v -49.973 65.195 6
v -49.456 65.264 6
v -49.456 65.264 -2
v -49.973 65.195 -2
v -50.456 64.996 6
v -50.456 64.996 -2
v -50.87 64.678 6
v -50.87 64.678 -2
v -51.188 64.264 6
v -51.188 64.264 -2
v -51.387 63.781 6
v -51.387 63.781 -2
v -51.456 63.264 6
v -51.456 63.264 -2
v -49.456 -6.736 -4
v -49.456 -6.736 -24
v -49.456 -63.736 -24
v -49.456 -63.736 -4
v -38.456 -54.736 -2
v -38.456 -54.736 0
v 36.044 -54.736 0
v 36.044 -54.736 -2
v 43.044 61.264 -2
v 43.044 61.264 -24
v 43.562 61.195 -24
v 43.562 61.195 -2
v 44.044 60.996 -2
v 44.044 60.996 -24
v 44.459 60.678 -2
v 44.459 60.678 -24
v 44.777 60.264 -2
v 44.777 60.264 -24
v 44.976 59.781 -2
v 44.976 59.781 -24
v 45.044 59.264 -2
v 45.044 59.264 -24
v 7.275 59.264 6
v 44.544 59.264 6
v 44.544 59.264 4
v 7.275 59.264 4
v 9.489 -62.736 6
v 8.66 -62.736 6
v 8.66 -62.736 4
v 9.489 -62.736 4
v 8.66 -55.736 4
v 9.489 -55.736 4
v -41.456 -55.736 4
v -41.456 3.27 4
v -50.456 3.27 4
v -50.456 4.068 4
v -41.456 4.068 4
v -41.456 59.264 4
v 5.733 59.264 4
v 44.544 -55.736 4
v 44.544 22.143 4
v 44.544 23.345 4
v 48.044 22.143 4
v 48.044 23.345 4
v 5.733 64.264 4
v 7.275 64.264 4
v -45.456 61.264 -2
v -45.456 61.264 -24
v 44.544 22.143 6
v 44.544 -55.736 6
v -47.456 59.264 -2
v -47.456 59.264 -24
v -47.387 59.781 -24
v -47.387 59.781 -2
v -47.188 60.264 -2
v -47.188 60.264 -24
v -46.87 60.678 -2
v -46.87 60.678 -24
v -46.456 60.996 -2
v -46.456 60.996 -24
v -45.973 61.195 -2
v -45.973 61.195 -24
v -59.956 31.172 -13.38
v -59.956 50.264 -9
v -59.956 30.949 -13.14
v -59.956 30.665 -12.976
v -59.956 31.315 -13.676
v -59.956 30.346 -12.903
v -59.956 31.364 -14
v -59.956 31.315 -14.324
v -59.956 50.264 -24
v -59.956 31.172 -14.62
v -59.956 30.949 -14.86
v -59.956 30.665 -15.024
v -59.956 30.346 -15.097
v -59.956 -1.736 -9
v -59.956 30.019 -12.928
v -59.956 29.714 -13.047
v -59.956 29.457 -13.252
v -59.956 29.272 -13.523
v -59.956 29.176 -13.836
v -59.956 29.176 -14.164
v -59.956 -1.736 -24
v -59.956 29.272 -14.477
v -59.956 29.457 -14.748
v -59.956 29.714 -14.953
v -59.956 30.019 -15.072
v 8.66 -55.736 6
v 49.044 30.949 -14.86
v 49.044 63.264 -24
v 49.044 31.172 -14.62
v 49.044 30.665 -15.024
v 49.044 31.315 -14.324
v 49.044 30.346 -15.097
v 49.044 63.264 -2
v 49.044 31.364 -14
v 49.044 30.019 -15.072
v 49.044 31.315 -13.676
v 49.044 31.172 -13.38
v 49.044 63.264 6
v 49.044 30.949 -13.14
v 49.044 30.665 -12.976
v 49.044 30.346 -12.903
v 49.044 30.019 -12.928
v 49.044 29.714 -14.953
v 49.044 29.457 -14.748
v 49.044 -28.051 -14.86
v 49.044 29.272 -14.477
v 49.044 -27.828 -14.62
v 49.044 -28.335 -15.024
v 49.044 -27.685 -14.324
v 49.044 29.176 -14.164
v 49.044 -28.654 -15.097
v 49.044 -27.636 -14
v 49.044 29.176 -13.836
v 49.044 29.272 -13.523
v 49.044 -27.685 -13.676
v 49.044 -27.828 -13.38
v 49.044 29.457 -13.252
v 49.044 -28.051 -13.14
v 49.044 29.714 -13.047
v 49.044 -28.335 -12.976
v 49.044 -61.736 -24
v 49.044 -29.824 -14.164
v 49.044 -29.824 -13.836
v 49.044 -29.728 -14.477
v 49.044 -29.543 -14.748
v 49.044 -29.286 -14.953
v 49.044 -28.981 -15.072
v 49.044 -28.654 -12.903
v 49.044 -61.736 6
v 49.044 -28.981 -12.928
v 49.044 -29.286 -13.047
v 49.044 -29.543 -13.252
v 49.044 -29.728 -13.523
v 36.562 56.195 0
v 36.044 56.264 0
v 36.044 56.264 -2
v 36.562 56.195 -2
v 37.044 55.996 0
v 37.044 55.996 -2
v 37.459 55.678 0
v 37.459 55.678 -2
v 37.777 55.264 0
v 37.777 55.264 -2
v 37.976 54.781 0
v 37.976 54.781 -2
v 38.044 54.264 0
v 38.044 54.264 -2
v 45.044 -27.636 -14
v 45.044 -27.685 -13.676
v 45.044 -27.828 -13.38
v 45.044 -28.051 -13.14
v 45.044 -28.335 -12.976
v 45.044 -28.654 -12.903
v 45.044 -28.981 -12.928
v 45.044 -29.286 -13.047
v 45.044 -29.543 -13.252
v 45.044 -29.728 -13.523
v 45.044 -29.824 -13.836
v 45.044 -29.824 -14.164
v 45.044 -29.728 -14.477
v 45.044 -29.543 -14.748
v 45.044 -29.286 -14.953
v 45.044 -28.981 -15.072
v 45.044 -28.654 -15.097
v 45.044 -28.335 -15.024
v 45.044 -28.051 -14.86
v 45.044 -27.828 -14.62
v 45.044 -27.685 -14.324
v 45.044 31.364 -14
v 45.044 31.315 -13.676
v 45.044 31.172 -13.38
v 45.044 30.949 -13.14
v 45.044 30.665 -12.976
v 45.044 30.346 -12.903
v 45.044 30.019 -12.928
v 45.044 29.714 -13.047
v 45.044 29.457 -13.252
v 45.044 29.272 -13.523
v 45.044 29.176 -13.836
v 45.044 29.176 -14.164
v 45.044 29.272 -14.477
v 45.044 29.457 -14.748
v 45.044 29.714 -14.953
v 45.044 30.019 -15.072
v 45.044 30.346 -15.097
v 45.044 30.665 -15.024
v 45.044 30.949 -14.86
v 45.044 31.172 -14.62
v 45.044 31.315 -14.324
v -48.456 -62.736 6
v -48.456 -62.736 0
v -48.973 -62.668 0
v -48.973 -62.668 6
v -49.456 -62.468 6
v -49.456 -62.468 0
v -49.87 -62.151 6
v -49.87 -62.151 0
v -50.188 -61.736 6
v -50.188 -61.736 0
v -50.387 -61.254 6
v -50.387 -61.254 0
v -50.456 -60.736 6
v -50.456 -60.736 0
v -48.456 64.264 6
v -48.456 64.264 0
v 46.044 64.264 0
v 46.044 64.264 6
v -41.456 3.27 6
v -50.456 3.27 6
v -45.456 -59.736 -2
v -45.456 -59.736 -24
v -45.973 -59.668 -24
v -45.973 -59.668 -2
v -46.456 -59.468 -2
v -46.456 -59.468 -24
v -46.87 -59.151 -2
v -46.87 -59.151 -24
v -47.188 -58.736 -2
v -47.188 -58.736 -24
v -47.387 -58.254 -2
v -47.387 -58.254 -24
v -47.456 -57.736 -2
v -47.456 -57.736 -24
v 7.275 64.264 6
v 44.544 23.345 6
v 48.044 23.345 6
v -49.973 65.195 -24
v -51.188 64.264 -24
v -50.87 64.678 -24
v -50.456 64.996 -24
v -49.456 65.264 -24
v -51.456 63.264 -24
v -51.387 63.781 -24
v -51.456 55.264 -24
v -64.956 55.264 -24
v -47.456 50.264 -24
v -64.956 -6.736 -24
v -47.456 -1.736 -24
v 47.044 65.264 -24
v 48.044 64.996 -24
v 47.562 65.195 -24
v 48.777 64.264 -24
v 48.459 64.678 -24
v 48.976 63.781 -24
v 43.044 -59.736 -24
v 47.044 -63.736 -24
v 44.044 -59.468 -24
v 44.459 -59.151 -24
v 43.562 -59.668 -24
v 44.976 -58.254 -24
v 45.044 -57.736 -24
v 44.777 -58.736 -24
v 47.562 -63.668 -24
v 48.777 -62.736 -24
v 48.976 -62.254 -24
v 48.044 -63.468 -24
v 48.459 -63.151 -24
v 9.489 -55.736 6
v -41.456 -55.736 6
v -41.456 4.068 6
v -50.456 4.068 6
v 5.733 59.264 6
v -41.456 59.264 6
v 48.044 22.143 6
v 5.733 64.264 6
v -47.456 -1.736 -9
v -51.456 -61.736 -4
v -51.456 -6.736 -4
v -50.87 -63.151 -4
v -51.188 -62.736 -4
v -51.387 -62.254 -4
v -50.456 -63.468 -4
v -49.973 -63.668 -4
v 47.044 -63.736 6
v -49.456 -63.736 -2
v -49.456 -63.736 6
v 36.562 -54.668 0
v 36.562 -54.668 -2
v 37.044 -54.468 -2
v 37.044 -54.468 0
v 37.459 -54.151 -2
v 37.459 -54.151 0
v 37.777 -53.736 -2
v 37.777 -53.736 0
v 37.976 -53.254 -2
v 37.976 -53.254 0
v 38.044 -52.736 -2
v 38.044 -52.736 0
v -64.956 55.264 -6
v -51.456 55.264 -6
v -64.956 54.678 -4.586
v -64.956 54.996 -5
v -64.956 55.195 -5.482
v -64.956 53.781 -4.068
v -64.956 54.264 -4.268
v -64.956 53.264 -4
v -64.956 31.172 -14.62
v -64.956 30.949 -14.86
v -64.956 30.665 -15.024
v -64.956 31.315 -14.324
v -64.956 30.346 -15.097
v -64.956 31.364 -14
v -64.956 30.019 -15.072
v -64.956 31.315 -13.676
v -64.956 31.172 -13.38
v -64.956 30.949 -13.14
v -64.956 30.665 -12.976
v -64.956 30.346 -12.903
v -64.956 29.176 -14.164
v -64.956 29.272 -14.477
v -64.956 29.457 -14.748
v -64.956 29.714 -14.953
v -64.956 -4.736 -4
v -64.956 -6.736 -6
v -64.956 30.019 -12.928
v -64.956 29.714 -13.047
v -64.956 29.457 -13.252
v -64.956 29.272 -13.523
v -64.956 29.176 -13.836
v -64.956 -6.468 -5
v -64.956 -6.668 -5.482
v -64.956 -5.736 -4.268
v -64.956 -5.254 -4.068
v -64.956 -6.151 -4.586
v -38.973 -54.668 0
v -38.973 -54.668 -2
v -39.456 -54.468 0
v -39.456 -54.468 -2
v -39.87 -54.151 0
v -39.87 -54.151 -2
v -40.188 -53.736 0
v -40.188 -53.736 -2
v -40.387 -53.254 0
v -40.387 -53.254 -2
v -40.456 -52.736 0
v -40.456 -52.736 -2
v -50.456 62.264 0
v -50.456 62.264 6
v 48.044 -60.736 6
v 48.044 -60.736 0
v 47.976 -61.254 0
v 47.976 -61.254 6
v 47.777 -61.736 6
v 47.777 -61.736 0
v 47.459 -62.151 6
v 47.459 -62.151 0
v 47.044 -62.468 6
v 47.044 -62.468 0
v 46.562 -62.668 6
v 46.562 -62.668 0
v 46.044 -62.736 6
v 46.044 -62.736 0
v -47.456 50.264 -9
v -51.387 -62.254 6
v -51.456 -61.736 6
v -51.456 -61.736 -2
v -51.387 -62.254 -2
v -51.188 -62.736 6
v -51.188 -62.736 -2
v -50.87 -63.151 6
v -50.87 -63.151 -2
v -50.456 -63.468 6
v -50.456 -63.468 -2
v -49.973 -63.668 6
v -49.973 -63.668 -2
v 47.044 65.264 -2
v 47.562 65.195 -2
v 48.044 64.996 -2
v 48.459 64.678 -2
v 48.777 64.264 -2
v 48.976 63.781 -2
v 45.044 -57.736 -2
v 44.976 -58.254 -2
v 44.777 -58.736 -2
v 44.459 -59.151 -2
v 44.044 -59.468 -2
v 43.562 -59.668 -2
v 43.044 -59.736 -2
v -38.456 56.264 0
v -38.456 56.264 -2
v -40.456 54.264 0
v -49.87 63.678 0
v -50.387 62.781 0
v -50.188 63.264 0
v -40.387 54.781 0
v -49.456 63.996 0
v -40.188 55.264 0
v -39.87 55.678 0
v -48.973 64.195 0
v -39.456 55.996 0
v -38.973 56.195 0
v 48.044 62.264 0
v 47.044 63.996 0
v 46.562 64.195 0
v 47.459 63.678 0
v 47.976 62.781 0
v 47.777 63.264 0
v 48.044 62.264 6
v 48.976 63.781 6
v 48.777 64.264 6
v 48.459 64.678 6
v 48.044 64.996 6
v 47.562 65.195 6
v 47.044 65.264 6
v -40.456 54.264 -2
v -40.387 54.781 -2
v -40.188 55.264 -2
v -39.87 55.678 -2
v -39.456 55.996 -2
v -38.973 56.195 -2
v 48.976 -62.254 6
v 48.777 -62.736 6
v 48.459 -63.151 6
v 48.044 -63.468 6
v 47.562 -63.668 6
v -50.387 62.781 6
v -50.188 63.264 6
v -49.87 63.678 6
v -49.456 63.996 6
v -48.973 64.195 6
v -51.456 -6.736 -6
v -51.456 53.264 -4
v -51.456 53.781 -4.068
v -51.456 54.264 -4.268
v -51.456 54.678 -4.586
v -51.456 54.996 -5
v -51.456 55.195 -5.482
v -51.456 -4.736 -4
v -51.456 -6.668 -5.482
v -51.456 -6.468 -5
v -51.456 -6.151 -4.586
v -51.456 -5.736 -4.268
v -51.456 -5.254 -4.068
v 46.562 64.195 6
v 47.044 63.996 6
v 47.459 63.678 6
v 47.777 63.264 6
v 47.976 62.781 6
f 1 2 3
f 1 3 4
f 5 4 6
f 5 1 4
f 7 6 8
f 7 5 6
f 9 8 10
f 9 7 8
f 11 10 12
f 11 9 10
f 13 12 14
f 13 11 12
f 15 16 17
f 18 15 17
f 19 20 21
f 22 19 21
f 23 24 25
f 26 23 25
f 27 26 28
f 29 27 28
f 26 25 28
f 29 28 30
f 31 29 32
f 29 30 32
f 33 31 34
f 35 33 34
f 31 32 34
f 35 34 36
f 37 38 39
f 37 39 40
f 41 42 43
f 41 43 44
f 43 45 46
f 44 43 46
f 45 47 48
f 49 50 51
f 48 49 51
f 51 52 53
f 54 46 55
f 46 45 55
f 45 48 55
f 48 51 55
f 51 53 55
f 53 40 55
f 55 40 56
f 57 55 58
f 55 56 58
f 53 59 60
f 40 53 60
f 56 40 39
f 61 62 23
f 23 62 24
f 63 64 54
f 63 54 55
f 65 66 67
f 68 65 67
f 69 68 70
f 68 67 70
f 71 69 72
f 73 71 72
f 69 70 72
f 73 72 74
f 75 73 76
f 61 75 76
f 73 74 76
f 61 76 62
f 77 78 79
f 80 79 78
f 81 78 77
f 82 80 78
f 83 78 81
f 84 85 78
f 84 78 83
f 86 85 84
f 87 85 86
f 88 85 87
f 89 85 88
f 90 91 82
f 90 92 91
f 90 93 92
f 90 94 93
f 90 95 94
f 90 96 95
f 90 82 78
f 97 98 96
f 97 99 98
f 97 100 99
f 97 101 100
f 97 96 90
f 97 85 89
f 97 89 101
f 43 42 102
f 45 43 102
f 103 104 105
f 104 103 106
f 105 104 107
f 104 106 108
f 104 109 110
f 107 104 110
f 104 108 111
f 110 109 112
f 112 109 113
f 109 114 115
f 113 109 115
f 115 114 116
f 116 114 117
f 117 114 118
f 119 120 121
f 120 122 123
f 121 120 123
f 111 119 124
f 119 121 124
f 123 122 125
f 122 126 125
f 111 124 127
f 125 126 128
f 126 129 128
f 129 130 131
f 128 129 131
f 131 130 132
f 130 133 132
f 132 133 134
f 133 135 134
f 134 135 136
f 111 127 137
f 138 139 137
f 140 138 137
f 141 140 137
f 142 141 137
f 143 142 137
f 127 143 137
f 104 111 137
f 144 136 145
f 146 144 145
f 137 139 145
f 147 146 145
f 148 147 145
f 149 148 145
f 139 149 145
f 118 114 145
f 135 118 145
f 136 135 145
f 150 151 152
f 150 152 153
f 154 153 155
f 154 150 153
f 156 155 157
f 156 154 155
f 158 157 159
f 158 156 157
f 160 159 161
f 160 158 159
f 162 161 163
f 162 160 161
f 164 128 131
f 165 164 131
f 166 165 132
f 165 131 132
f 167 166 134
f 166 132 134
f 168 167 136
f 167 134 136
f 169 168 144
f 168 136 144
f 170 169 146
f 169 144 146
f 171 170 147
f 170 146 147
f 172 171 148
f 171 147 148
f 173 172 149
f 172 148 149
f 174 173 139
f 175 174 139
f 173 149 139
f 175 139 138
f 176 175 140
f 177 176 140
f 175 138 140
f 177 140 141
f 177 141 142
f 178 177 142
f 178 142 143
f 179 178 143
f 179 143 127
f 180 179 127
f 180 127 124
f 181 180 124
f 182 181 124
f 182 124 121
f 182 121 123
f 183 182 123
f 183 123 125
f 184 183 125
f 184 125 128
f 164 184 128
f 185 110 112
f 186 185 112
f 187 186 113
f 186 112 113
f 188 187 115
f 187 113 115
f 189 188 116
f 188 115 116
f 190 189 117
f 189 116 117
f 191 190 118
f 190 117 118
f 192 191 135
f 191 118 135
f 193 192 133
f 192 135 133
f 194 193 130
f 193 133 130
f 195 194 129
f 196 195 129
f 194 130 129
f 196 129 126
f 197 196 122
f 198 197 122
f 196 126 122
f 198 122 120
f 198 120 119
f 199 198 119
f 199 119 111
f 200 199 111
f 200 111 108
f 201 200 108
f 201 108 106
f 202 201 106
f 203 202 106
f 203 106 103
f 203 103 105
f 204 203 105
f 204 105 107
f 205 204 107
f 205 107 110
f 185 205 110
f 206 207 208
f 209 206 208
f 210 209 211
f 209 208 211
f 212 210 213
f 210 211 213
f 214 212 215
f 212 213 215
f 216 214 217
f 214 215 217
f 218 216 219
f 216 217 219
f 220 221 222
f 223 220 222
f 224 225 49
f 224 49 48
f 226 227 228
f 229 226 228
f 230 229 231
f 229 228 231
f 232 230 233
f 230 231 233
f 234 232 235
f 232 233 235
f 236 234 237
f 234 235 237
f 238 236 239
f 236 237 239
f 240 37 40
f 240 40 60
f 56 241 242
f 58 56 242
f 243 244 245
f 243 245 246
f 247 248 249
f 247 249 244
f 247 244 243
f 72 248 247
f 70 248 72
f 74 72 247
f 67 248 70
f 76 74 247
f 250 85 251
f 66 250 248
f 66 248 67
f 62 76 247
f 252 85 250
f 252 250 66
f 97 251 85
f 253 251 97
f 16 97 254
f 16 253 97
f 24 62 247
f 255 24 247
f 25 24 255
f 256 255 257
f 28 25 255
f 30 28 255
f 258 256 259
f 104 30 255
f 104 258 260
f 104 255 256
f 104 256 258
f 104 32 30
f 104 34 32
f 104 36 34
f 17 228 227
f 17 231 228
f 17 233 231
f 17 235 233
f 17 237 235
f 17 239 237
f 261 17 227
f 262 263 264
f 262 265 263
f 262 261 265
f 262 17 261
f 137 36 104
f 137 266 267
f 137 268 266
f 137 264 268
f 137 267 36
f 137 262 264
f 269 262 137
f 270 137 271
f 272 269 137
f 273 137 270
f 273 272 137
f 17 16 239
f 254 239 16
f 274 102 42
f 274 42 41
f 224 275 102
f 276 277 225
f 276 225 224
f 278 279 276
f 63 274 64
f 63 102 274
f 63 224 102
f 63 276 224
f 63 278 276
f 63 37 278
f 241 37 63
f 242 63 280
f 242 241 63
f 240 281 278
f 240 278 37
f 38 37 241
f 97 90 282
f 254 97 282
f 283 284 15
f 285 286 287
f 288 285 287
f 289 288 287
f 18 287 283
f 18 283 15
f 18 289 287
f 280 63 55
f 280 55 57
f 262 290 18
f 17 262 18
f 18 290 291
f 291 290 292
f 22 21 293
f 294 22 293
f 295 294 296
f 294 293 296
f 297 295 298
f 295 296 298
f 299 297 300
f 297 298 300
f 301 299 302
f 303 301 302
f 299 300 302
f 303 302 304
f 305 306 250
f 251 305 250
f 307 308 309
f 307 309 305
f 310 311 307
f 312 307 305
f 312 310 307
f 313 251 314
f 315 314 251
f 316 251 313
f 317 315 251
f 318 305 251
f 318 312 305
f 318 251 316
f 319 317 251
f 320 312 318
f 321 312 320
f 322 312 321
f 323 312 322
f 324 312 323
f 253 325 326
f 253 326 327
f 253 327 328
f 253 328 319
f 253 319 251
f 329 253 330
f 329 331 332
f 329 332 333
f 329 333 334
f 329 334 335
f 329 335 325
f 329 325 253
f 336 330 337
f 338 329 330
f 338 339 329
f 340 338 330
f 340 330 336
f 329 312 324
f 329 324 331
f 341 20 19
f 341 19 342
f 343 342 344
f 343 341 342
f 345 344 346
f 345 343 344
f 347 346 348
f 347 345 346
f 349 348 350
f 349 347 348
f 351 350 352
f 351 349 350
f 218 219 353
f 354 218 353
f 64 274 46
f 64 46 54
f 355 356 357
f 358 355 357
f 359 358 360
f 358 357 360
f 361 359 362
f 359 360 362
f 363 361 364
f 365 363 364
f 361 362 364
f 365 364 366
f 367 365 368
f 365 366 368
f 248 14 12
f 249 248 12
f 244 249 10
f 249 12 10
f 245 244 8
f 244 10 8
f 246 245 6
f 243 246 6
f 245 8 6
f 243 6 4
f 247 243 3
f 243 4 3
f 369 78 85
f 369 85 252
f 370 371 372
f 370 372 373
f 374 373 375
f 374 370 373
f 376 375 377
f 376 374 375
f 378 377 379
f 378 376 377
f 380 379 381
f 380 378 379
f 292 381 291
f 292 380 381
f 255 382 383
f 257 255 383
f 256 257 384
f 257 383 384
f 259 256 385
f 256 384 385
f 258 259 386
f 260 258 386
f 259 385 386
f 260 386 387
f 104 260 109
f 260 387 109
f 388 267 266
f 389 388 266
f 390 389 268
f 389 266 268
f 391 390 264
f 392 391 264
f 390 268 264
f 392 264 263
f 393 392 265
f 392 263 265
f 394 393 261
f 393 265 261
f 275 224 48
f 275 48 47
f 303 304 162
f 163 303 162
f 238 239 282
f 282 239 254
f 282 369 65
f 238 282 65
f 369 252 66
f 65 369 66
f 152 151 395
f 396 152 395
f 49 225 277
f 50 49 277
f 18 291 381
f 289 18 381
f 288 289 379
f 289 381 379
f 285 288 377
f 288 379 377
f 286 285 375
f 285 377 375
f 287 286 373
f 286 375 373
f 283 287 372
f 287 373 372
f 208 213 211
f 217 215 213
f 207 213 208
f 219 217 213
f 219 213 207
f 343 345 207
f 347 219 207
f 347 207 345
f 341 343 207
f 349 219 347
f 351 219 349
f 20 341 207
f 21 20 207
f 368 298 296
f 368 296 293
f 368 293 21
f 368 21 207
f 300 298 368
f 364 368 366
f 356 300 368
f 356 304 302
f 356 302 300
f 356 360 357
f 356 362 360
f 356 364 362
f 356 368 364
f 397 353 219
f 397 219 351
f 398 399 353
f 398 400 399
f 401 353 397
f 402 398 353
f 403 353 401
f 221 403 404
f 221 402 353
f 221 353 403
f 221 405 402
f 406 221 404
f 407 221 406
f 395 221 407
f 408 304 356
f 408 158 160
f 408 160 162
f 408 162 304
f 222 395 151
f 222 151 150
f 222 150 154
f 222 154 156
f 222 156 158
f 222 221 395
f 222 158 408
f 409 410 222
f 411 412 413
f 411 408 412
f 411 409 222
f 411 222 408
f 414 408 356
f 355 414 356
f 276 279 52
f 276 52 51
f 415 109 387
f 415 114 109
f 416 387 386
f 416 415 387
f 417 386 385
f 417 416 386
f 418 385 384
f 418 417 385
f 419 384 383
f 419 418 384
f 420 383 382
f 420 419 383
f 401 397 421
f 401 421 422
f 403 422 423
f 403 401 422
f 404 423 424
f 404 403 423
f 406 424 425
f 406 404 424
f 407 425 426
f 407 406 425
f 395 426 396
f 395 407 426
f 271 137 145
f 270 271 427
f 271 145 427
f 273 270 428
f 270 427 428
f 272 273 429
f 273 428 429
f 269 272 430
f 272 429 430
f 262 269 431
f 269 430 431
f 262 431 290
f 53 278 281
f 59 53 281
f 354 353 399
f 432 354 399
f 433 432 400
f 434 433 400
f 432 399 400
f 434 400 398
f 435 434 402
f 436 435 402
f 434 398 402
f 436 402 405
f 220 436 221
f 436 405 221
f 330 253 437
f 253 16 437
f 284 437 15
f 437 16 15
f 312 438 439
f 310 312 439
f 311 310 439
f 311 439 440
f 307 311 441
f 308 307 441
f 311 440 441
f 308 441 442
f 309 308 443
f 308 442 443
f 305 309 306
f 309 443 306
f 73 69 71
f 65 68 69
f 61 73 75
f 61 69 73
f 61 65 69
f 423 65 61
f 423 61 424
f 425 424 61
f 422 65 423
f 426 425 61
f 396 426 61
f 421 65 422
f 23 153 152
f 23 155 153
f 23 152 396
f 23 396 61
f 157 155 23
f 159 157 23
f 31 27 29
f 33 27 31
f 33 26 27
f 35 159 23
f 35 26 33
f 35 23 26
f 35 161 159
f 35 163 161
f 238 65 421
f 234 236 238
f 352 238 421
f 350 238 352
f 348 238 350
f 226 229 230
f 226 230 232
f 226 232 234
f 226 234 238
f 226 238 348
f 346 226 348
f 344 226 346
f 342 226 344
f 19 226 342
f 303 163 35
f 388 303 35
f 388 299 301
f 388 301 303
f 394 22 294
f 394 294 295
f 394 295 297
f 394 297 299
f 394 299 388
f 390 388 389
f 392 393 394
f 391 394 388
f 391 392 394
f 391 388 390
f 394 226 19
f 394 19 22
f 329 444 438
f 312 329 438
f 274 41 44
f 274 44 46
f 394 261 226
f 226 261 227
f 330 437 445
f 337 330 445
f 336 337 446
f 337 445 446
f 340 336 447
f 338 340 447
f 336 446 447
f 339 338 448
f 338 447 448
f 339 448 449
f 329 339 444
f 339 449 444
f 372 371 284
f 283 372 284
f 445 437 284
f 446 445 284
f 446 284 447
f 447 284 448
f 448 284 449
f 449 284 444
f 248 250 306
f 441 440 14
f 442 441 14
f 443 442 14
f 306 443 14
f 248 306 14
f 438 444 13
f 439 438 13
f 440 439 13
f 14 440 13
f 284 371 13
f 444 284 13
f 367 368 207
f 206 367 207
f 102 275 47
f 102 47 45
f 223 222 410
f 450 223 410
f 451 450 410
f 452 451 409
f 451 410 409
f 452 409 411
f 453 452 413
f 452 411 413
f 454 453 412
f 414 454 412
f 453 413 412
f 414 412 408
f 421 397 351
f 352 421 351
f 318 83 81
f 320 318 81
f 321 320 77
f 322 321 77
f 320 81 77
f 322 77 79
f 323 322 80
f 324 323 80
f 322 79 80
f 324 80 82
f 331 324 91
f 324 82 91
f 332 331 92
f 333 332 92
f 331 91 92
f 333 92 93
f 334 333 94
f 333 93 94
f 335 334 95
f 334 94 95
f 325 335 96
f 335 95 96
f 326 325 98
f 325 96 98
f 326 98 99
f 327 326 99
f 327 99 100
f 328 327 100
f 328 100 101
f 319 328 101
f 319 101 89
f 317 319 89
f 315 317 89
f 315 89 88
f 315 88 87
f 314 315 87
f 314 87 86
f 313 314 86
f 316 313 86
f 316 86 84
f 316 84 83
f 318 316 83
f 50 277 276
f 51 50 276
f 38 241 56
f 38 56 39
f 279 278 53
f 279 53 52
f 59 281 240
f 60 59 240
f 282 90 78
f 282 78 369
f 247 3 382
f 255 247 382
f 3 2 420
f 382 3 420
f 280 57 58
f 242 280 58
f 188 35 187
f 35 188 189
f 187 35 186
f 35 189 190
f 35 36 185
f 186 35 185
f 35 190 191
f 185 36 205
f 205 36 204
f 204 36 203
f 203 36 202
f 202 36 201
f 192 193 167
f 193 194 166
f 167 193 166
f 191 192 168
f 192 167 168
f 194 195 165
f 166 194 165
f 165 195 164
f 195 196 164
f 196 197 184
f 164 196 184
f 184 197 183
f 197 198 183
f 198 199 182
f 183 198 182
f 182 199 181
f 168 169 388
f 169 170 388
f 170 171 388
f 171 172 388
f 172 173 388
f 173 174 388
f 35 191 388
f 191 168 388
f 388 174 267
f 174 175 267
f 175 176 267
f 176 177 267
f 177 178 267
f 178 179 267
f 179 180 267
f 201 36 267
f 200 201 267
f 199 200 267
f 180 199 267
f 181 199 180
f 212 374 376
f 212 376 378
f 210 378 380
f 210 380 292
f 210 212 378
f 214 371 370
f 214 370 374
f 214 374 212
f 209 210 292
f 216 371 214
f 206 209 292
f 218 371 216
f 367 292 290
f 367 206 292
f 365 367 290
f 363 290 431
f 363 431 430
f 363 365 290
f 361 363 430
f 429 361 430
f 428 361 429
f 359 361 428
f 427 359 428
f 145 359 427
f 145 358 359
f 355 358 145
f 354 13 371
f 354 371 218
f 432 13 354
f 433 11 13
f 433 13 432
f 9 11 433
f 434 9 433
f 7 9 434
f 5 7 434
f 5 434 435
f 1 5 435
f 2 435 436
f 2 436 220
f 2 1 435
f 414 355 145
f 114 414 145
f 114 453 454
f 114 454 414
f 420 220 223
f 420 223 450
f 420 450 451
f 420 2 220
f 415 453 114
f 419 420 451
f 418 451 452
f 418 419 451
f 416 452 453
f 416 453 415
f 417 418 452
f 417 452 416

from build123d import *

# Parameters (mm, degrees)
F1_DEPTH  = 6
F3_DEPTH  = 2
F4_DEPTH  = 22
F6_DEPTH  = 22
F7_W      = 1.541879
F7_H      = 5
F7_W_2    = 9
F7_H_2    = 0.79839
F7_W_3    = 3.5
F7_H_3    = 1.202248
F7_W_4    = 0.828379
F7_H_4    = 7
F8_DEPTH  = 2
F10_DEPTH = 13.5
F11_W     = 29.551757
F11_H     = 60.03771
F12_DEPTH = 20
F13_W     = 24.233846
F13_H     = 52
F14_DEPTH = 15
F15_R     = 1.1
F17_DEPTH = 120
F16_R     = 1.1
F18_DEPTH = 25


with BuildPart() as f1:
    # F0 (on Top) → F1 (new body)
    with BuildSketch(Plane.XY):
        with BuildLine():
            Line((47.044474, 65.263562), (-49.455526, 65.263562))
            ThreePointArc((-49.455526, 65.263562), (-50.869739, 64.677775), (-51.455526, 63.263562))
            Line((-51.455526, 63.263562), (-51.455526, -61.736438))
            ThreePointArc((-51.455526, -61.736438), (-50.869739, -63.150652), (-49.455526, -63.736438))
            Line((-49.455526, -63.736438), (47.044474, -63.736438))
            ThreePointArc((47.044474, -63.736438), (48.458688, -63.150652), (49.044474, -61.736438))
            Line((49.044474, -61.736438), (49.044474, 63.263562))
            ThreePointArc((49.044474, 63.263562), (48.458688, 64.677775), (47.044474, 65.263562))
        make_face()
        with BuildLine():
            ThreePointArc((-50.455526, 62.263562), (-49.869739, 63.677775), (-48.455526, 64.263562))
            Line((-48.455526, 64.263562), (46.044474, 64.263562))
            ThreePointArc((46.044474, 64.263562), (47.458688, 63.677775), (48.044474, 62.263562))
            Line((48.044474, 62.263562), (48.044474, -60.736438))
            ThreePointArc((48.044474, -60.736438), (47.458688, -62.150652), (46.044474, -62.736438))
            Line((46.044474, -62.736438), (-48.455526, -62.736438))
            ThreePointArc((-48.455526, -62.736438), (-49.869739, -62.150652), (-50.455526, -60.736438))
            Line((-50.455526, -60.736438), (-50.455526, 62.263562))
        make_face(mode=Mode.SUBTRACT)
    extrude(amount=F1_DEPTH)

    # F2 (on Top) → F3 (join)
    with BuildSketch(Plane.XY):
        with BuildLine():
            Line((47.044474, 65.263562), (-49.455526, 65.263562))
            ThreePointArc((-49.455526, 65.263562), (-50.869739, 64.677775), (-51.455526, 63.263562))
            Line((-51.455526, 63.263562), (-51.455526, -61.736438))
            ThreePointArc((-51.455526, -61.736438), (-50.869739, -63.150652), (-49.455526, -63.736438))
            Line((-49.455526, -63.736438), (47.044474, -63.736438))
            ThreePointArc((47.044474, -63.736438), (48.458688, -63.150652), (49.044474, -61.736438))
            Line((49.044474, -61.736438), (49.044474, 63.263562))
            ThreePointArc((49.044474, 63.263562), (48.458688, 64.677775), (47.044474, 65.263562))
        make_face()
        with BuildLine():
            ThreePointArc((-40.455526, 54.263562), (-39.869739, 55.677775), (-38.455526, 56.263562))
            Line((-38.455526, 56.263562), (36.044474, 56.263562))
            ThreePointArc((36.044474, 56.263562), (37.458688, 55.677775), (38.044474, 54.263562))
            Line((38.044474, 54.263562), (38.044474, -52.736438))
            ThreePointArc((38.044474, -52.736438), (37.458688, -54.150652), (36.044474, -54.736438))
            Line((36.044474, -54.736438), (-38.455526, -54.736438))
            ThreePointArc((-38.455526, -54.736438), (-39.869739, -54.150652), (-40.455526, -52.736438))
            Line((-40.455526, -52.736438), (-40.455526, 54.263562))
        make_face(mode=Mode.SUBTRACT)
    extrude(amount=-F3_DEPTH)

    # F3_face (on face) → F4 (join)
    with BuildSketch(Plane(origin=(-1.205526, 0.763562, -2), x_dir=(1, 0, 0), z_dir=(0, 0, -1))):
        with BuildLine():
            Line((-48.25, -64.5), (48.25, -64.5))
            ThreePointArc((48.25, -64.5), (49.664214, -63.914214), (50.25, -62.5))
            Line((50.25, -62.5), (50.25, 62.5))
            ThreePointArc((50.25, 62.5), (49.664214, 63.914214), (48.25, 64.5))
            Line((48.25, 64.5), (-48.25, 64.5))
            ThreePointArc((-48.25, 64.5), (-49.664214, 63.914214), (-50.25, 62.5))
            Line((-50.25, 62.5), (-50.25, -62.5))
            ThreePointArc((-50.25, -62.5), (-49.664214, -63.914214), (-48.25, -64.5))
        make_face()
        with BuildLine():
            ThreePointArc((-39.25, 53.5), (-38.664214, 54.914214), (-37.25, 55.5))
            Line((-37.25, 55.5), (37.25, 55.5))
            ThreePointArc((37.25, 55.5), (38.664214, 54.914214), (39.25, 53.5))
            Line((39.25, 53.5), (39.25, -53.5))
            ThreePointArc((39.25, -53.5), (38.664214, -54.914214), (37.25, -55.5))
            Line((37.25, -55.5), (-37.25, -55.5))
            ThreePointArc((-37.25, -55.5), (-38.664214, -54.914214), (-39.25, -53.5))
            Line((-39.25, -53.5), (-39.25, 53.5))
        make_face(mode=Mode.SUBTRACT)
    extrude(amount=F4_DEPTH)

    # F5 (on face) → F6 (cut)
    with BuildSketch(Plane(origin=(0, 0, -24), x_dir=(1, 0, 0), z_dir=(0, 0, -1))):
        with BuildLine():
            Line((43.044474, 59.736438), (-45.455526, 59.736438))
            ThreePointArc((-45.455526, 59.736438), (-46.869739, 59.150652), (-47.455526, 57.736438))
            Line((-47.455526, 57.736438), (-47.455526, -59.263562))
            ThreePointArc((-47.455526, -59.263562), (-46.869739, -60.677775), (-45.455526, -61.263562))
            Line((-45.455526, -61.263562), (43.044474, -61.263562))
            ThreePointArc((43.044474, -61.263562), (44.458688, -60.677775), (45.044474, -59.263562))
            Line((45.044474, -59.263562), (45.044474, 57.736438))
            ThreePointArc((45.044474, 57.736438), (44.458688, 59.150652), (43.044474, 59.736438))
        make_face()
    extrude(amount=-F6_DEPTH, mode=Mode.SUBTRACT)

    # F9 (on face) → F10 (join)
    with BuildSketch(Plane(origin=(-51.455526, 0, 0), x_dir=(0, -1, 0), z_dir=(-1, 0, 0))):
        with BuildLine():
            Line((4.736438, -4), (-53.263562, -4))
            ThreePointArc((-53.263562, -4), (-54.677775, -4.585786), (-55.263562, -6))
            Line((-55.263562, -6), (-55.263562, -24))
            Line((-55.263562, -24), (6.736438, -24))
            Line((6.736438, -24), (6.736438, -6))
            ThreePointArc((6.736438, -6), (6.150652, -4.585786), (4.736438, -4))
        make_face()
    extrude(amount=F10_DEPTH)

    # F11 (on face) → F12 (cut)
    with BuildSketch(Plane(origin=(0, 0, -24), x_dir=(1, 0, 0), z_dir=(0, 0, -1))):
        with Locations((-64.231404, 36.755293)):
            Rectangle(F11_W, F11_H)
    extrude(amount=-F12_DEPTH, mode=Mode.SUBTRACT)

    # F13 (on face) → F14 (cut)
    with BuildSketch(Plane(origin=(0, 0, -24), x_dir=(1, 0, 0), z_dir=(0, 0, -1))):
        with Locations((-47.838603, -24.263562)):
            Rectangle(F13_W, F13_H)
    extrude(amount=-F14_DEPTH, mode=Mode.SUBTRACT)

    # F15 (on face) → F17 (cut)
    with BuildSketch(Plane.YZ.offset(49.044474)):
        with Locations((30.263562, -14)):
            Circle(F15_R)
    extrude(amount=-F17_DEPTH, mode=Mode.SUBTRACT)

    # F16 (on face) → F18 (cut)
    with BuildSketch(Plane.YZ.offset(49.044474)):
        with Locations((-28.736438, -14)):
            Circle(F16_R)
    extrude(amount=-F18_DEPTH, mode=Mode.SUBTRACT)


with BuildPart() as f8:
    # F7 (on face) → F8 (new body)
    with BuildSketch(Plane.XY.offset(6)):
        Polygon((5.732744, 59.263562), (-41.455526, 59.263562), (-41.455526, 4.068462), (-41.455526, 3.270072), (-41.455526, -55.736438), (8.660411, -55.736438), (9.48879, -55.736438), (44.544474, -55.736438), (44.544474, 22.143247), (44.544474, 23.345495), (44.544474, 59.263562), (7.274623, 59.263562), align=None)
        with Locations((6.503683, 61.763562)):
            Rectangle(F7_W, F7_H)
        with Locations((-45.955526, 3.669267)):
            Rectangle(F7_W_2, F7_H_2)
        with Locations((46.294474, 22.744371)):
            Rectangle(F7_W_3, F7_H_3)
        with Locations((9.0746, -59.236438)):
            Rectangle(F7_W_4, F7_H_4)
    extrude(amount=-F8_DEPTH)


solid = Compound([f1.part, f8.part])
